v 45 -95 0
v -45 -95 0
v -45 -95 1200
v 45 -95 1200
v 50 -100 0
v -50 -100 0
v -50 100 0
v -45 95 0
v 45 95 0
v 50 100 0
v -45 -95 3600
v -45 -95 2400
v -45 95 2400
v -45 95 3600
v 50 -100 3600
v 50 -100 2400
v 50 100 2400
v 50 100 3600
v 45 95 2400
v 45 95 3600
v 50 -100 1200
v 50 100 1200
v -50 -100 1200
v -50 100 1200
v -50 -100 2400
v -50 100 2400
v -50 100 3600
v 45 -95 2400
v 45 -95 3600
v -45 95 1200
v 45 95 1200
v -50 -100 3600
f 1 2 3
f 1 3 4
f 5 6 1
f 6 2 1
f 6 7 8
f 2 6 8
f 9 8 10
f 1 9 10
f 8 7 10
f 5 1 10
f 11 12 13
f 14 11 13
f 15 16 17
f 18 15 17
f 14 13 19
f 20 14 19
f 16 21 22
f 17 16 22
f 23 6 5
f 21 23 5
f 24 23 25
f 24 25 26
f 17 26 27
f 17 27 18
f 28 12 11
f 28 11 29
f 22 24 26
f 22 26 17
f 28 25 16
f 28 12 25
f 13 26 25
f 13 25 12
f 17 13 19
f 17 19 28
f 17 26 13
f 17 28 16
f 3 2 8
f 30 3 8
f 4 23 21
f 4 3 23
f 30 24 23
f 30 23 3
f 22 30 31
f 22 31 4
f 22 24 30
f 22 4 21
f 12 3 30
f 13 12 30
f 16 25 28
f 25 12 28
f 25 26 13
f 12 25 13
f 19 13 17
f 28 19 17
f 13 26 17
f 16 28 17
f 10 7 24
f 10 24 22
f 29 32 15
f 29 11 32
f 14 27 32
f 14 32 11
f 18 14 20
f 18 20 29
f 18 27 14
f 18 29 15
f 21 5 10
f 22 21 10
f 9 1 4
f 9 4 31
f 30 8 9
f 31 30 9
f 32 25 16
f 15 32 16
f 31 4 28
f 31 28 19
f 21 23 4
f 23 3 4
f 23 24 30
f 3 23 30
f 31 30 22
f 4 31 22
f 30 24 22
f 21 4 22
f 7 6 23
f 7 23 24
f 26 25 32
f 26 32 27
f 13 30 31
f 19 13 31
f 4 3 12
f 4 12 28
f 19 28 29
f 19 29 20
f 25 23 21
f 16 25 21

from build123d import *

# Parameters (mm, degrees)
SKETCH_2_W      = 100
SKETCH_2_H      = 200
SKETCH_2_W_2    = 90
SKETCH_2_H_2    = 190
EXTRUDE_1_DEPTH = 1200
EXTRUDE_START   = 1200
SKETCH_2_2_W    = 100
SKETCH_2_2_H    = 200
SKETCH_2_2_W_2  = 90
SKETCH_2_2_H_2  = 190
EXTRUDE_2_DEPTH = 1200
EXTRUDE_START_2 = 2400
SKETCH_2_3_W    = 100
SKETCH_2_3_H    = 200
SKETCH_2_3_W_2  = 90
SKETCH_2_3_H_2  = 190
EXTRUDE_3_DEPTH = 1200


with BuildPart() as part:
    # Эскиз2 → Бобышка-Вытянуть1 (new body)
    with BuildSketch(Plane.XY):
        Rectangle(SKETCH_2_W, SKETCH_2_H)
        Rectangle(SKETCH_2_W_2, SKETCH_2_H_2, mode=Mode.SUBTRACT)
    extrude(amount=EXTRUDE_1_DEPTH)


with BuildPart() as body_2:
    # Эскиз2<2> → Бобышка-Вытянуть2 (new body)
    with BuildSketch(Plane.XY.offset(EXTRUDE_START)):
        Rectangle(SKETCH_2_2_W, SKETCH_2_2_H)
        Rectangle(SKETCH_2_2_W_2, SKETCH_2_2_H_2, mode=Mode.SUBTRACT)
    extrude(amount=EXTRUDE_2_DEPTH)


with BuildPart() as body_3:
    # Эскиз2<3> → Бобышка-Вытянуть3 (new body)
    with BuildSketch(Plane.XY.offset(EXTRUDE_START_2)):
        Rectangle(SKETCH_2_3_W, SKETCH_2_3_H)
        Rectangle(SKETCH_2_3_W_2, SKETCH_2_3_H_2, mode=Mode.SUBTRACT)
    extrude(amount=EXTRUDE_3_DEPTH)


solid = Compound([part.part, body_2.part, body_3.part])
